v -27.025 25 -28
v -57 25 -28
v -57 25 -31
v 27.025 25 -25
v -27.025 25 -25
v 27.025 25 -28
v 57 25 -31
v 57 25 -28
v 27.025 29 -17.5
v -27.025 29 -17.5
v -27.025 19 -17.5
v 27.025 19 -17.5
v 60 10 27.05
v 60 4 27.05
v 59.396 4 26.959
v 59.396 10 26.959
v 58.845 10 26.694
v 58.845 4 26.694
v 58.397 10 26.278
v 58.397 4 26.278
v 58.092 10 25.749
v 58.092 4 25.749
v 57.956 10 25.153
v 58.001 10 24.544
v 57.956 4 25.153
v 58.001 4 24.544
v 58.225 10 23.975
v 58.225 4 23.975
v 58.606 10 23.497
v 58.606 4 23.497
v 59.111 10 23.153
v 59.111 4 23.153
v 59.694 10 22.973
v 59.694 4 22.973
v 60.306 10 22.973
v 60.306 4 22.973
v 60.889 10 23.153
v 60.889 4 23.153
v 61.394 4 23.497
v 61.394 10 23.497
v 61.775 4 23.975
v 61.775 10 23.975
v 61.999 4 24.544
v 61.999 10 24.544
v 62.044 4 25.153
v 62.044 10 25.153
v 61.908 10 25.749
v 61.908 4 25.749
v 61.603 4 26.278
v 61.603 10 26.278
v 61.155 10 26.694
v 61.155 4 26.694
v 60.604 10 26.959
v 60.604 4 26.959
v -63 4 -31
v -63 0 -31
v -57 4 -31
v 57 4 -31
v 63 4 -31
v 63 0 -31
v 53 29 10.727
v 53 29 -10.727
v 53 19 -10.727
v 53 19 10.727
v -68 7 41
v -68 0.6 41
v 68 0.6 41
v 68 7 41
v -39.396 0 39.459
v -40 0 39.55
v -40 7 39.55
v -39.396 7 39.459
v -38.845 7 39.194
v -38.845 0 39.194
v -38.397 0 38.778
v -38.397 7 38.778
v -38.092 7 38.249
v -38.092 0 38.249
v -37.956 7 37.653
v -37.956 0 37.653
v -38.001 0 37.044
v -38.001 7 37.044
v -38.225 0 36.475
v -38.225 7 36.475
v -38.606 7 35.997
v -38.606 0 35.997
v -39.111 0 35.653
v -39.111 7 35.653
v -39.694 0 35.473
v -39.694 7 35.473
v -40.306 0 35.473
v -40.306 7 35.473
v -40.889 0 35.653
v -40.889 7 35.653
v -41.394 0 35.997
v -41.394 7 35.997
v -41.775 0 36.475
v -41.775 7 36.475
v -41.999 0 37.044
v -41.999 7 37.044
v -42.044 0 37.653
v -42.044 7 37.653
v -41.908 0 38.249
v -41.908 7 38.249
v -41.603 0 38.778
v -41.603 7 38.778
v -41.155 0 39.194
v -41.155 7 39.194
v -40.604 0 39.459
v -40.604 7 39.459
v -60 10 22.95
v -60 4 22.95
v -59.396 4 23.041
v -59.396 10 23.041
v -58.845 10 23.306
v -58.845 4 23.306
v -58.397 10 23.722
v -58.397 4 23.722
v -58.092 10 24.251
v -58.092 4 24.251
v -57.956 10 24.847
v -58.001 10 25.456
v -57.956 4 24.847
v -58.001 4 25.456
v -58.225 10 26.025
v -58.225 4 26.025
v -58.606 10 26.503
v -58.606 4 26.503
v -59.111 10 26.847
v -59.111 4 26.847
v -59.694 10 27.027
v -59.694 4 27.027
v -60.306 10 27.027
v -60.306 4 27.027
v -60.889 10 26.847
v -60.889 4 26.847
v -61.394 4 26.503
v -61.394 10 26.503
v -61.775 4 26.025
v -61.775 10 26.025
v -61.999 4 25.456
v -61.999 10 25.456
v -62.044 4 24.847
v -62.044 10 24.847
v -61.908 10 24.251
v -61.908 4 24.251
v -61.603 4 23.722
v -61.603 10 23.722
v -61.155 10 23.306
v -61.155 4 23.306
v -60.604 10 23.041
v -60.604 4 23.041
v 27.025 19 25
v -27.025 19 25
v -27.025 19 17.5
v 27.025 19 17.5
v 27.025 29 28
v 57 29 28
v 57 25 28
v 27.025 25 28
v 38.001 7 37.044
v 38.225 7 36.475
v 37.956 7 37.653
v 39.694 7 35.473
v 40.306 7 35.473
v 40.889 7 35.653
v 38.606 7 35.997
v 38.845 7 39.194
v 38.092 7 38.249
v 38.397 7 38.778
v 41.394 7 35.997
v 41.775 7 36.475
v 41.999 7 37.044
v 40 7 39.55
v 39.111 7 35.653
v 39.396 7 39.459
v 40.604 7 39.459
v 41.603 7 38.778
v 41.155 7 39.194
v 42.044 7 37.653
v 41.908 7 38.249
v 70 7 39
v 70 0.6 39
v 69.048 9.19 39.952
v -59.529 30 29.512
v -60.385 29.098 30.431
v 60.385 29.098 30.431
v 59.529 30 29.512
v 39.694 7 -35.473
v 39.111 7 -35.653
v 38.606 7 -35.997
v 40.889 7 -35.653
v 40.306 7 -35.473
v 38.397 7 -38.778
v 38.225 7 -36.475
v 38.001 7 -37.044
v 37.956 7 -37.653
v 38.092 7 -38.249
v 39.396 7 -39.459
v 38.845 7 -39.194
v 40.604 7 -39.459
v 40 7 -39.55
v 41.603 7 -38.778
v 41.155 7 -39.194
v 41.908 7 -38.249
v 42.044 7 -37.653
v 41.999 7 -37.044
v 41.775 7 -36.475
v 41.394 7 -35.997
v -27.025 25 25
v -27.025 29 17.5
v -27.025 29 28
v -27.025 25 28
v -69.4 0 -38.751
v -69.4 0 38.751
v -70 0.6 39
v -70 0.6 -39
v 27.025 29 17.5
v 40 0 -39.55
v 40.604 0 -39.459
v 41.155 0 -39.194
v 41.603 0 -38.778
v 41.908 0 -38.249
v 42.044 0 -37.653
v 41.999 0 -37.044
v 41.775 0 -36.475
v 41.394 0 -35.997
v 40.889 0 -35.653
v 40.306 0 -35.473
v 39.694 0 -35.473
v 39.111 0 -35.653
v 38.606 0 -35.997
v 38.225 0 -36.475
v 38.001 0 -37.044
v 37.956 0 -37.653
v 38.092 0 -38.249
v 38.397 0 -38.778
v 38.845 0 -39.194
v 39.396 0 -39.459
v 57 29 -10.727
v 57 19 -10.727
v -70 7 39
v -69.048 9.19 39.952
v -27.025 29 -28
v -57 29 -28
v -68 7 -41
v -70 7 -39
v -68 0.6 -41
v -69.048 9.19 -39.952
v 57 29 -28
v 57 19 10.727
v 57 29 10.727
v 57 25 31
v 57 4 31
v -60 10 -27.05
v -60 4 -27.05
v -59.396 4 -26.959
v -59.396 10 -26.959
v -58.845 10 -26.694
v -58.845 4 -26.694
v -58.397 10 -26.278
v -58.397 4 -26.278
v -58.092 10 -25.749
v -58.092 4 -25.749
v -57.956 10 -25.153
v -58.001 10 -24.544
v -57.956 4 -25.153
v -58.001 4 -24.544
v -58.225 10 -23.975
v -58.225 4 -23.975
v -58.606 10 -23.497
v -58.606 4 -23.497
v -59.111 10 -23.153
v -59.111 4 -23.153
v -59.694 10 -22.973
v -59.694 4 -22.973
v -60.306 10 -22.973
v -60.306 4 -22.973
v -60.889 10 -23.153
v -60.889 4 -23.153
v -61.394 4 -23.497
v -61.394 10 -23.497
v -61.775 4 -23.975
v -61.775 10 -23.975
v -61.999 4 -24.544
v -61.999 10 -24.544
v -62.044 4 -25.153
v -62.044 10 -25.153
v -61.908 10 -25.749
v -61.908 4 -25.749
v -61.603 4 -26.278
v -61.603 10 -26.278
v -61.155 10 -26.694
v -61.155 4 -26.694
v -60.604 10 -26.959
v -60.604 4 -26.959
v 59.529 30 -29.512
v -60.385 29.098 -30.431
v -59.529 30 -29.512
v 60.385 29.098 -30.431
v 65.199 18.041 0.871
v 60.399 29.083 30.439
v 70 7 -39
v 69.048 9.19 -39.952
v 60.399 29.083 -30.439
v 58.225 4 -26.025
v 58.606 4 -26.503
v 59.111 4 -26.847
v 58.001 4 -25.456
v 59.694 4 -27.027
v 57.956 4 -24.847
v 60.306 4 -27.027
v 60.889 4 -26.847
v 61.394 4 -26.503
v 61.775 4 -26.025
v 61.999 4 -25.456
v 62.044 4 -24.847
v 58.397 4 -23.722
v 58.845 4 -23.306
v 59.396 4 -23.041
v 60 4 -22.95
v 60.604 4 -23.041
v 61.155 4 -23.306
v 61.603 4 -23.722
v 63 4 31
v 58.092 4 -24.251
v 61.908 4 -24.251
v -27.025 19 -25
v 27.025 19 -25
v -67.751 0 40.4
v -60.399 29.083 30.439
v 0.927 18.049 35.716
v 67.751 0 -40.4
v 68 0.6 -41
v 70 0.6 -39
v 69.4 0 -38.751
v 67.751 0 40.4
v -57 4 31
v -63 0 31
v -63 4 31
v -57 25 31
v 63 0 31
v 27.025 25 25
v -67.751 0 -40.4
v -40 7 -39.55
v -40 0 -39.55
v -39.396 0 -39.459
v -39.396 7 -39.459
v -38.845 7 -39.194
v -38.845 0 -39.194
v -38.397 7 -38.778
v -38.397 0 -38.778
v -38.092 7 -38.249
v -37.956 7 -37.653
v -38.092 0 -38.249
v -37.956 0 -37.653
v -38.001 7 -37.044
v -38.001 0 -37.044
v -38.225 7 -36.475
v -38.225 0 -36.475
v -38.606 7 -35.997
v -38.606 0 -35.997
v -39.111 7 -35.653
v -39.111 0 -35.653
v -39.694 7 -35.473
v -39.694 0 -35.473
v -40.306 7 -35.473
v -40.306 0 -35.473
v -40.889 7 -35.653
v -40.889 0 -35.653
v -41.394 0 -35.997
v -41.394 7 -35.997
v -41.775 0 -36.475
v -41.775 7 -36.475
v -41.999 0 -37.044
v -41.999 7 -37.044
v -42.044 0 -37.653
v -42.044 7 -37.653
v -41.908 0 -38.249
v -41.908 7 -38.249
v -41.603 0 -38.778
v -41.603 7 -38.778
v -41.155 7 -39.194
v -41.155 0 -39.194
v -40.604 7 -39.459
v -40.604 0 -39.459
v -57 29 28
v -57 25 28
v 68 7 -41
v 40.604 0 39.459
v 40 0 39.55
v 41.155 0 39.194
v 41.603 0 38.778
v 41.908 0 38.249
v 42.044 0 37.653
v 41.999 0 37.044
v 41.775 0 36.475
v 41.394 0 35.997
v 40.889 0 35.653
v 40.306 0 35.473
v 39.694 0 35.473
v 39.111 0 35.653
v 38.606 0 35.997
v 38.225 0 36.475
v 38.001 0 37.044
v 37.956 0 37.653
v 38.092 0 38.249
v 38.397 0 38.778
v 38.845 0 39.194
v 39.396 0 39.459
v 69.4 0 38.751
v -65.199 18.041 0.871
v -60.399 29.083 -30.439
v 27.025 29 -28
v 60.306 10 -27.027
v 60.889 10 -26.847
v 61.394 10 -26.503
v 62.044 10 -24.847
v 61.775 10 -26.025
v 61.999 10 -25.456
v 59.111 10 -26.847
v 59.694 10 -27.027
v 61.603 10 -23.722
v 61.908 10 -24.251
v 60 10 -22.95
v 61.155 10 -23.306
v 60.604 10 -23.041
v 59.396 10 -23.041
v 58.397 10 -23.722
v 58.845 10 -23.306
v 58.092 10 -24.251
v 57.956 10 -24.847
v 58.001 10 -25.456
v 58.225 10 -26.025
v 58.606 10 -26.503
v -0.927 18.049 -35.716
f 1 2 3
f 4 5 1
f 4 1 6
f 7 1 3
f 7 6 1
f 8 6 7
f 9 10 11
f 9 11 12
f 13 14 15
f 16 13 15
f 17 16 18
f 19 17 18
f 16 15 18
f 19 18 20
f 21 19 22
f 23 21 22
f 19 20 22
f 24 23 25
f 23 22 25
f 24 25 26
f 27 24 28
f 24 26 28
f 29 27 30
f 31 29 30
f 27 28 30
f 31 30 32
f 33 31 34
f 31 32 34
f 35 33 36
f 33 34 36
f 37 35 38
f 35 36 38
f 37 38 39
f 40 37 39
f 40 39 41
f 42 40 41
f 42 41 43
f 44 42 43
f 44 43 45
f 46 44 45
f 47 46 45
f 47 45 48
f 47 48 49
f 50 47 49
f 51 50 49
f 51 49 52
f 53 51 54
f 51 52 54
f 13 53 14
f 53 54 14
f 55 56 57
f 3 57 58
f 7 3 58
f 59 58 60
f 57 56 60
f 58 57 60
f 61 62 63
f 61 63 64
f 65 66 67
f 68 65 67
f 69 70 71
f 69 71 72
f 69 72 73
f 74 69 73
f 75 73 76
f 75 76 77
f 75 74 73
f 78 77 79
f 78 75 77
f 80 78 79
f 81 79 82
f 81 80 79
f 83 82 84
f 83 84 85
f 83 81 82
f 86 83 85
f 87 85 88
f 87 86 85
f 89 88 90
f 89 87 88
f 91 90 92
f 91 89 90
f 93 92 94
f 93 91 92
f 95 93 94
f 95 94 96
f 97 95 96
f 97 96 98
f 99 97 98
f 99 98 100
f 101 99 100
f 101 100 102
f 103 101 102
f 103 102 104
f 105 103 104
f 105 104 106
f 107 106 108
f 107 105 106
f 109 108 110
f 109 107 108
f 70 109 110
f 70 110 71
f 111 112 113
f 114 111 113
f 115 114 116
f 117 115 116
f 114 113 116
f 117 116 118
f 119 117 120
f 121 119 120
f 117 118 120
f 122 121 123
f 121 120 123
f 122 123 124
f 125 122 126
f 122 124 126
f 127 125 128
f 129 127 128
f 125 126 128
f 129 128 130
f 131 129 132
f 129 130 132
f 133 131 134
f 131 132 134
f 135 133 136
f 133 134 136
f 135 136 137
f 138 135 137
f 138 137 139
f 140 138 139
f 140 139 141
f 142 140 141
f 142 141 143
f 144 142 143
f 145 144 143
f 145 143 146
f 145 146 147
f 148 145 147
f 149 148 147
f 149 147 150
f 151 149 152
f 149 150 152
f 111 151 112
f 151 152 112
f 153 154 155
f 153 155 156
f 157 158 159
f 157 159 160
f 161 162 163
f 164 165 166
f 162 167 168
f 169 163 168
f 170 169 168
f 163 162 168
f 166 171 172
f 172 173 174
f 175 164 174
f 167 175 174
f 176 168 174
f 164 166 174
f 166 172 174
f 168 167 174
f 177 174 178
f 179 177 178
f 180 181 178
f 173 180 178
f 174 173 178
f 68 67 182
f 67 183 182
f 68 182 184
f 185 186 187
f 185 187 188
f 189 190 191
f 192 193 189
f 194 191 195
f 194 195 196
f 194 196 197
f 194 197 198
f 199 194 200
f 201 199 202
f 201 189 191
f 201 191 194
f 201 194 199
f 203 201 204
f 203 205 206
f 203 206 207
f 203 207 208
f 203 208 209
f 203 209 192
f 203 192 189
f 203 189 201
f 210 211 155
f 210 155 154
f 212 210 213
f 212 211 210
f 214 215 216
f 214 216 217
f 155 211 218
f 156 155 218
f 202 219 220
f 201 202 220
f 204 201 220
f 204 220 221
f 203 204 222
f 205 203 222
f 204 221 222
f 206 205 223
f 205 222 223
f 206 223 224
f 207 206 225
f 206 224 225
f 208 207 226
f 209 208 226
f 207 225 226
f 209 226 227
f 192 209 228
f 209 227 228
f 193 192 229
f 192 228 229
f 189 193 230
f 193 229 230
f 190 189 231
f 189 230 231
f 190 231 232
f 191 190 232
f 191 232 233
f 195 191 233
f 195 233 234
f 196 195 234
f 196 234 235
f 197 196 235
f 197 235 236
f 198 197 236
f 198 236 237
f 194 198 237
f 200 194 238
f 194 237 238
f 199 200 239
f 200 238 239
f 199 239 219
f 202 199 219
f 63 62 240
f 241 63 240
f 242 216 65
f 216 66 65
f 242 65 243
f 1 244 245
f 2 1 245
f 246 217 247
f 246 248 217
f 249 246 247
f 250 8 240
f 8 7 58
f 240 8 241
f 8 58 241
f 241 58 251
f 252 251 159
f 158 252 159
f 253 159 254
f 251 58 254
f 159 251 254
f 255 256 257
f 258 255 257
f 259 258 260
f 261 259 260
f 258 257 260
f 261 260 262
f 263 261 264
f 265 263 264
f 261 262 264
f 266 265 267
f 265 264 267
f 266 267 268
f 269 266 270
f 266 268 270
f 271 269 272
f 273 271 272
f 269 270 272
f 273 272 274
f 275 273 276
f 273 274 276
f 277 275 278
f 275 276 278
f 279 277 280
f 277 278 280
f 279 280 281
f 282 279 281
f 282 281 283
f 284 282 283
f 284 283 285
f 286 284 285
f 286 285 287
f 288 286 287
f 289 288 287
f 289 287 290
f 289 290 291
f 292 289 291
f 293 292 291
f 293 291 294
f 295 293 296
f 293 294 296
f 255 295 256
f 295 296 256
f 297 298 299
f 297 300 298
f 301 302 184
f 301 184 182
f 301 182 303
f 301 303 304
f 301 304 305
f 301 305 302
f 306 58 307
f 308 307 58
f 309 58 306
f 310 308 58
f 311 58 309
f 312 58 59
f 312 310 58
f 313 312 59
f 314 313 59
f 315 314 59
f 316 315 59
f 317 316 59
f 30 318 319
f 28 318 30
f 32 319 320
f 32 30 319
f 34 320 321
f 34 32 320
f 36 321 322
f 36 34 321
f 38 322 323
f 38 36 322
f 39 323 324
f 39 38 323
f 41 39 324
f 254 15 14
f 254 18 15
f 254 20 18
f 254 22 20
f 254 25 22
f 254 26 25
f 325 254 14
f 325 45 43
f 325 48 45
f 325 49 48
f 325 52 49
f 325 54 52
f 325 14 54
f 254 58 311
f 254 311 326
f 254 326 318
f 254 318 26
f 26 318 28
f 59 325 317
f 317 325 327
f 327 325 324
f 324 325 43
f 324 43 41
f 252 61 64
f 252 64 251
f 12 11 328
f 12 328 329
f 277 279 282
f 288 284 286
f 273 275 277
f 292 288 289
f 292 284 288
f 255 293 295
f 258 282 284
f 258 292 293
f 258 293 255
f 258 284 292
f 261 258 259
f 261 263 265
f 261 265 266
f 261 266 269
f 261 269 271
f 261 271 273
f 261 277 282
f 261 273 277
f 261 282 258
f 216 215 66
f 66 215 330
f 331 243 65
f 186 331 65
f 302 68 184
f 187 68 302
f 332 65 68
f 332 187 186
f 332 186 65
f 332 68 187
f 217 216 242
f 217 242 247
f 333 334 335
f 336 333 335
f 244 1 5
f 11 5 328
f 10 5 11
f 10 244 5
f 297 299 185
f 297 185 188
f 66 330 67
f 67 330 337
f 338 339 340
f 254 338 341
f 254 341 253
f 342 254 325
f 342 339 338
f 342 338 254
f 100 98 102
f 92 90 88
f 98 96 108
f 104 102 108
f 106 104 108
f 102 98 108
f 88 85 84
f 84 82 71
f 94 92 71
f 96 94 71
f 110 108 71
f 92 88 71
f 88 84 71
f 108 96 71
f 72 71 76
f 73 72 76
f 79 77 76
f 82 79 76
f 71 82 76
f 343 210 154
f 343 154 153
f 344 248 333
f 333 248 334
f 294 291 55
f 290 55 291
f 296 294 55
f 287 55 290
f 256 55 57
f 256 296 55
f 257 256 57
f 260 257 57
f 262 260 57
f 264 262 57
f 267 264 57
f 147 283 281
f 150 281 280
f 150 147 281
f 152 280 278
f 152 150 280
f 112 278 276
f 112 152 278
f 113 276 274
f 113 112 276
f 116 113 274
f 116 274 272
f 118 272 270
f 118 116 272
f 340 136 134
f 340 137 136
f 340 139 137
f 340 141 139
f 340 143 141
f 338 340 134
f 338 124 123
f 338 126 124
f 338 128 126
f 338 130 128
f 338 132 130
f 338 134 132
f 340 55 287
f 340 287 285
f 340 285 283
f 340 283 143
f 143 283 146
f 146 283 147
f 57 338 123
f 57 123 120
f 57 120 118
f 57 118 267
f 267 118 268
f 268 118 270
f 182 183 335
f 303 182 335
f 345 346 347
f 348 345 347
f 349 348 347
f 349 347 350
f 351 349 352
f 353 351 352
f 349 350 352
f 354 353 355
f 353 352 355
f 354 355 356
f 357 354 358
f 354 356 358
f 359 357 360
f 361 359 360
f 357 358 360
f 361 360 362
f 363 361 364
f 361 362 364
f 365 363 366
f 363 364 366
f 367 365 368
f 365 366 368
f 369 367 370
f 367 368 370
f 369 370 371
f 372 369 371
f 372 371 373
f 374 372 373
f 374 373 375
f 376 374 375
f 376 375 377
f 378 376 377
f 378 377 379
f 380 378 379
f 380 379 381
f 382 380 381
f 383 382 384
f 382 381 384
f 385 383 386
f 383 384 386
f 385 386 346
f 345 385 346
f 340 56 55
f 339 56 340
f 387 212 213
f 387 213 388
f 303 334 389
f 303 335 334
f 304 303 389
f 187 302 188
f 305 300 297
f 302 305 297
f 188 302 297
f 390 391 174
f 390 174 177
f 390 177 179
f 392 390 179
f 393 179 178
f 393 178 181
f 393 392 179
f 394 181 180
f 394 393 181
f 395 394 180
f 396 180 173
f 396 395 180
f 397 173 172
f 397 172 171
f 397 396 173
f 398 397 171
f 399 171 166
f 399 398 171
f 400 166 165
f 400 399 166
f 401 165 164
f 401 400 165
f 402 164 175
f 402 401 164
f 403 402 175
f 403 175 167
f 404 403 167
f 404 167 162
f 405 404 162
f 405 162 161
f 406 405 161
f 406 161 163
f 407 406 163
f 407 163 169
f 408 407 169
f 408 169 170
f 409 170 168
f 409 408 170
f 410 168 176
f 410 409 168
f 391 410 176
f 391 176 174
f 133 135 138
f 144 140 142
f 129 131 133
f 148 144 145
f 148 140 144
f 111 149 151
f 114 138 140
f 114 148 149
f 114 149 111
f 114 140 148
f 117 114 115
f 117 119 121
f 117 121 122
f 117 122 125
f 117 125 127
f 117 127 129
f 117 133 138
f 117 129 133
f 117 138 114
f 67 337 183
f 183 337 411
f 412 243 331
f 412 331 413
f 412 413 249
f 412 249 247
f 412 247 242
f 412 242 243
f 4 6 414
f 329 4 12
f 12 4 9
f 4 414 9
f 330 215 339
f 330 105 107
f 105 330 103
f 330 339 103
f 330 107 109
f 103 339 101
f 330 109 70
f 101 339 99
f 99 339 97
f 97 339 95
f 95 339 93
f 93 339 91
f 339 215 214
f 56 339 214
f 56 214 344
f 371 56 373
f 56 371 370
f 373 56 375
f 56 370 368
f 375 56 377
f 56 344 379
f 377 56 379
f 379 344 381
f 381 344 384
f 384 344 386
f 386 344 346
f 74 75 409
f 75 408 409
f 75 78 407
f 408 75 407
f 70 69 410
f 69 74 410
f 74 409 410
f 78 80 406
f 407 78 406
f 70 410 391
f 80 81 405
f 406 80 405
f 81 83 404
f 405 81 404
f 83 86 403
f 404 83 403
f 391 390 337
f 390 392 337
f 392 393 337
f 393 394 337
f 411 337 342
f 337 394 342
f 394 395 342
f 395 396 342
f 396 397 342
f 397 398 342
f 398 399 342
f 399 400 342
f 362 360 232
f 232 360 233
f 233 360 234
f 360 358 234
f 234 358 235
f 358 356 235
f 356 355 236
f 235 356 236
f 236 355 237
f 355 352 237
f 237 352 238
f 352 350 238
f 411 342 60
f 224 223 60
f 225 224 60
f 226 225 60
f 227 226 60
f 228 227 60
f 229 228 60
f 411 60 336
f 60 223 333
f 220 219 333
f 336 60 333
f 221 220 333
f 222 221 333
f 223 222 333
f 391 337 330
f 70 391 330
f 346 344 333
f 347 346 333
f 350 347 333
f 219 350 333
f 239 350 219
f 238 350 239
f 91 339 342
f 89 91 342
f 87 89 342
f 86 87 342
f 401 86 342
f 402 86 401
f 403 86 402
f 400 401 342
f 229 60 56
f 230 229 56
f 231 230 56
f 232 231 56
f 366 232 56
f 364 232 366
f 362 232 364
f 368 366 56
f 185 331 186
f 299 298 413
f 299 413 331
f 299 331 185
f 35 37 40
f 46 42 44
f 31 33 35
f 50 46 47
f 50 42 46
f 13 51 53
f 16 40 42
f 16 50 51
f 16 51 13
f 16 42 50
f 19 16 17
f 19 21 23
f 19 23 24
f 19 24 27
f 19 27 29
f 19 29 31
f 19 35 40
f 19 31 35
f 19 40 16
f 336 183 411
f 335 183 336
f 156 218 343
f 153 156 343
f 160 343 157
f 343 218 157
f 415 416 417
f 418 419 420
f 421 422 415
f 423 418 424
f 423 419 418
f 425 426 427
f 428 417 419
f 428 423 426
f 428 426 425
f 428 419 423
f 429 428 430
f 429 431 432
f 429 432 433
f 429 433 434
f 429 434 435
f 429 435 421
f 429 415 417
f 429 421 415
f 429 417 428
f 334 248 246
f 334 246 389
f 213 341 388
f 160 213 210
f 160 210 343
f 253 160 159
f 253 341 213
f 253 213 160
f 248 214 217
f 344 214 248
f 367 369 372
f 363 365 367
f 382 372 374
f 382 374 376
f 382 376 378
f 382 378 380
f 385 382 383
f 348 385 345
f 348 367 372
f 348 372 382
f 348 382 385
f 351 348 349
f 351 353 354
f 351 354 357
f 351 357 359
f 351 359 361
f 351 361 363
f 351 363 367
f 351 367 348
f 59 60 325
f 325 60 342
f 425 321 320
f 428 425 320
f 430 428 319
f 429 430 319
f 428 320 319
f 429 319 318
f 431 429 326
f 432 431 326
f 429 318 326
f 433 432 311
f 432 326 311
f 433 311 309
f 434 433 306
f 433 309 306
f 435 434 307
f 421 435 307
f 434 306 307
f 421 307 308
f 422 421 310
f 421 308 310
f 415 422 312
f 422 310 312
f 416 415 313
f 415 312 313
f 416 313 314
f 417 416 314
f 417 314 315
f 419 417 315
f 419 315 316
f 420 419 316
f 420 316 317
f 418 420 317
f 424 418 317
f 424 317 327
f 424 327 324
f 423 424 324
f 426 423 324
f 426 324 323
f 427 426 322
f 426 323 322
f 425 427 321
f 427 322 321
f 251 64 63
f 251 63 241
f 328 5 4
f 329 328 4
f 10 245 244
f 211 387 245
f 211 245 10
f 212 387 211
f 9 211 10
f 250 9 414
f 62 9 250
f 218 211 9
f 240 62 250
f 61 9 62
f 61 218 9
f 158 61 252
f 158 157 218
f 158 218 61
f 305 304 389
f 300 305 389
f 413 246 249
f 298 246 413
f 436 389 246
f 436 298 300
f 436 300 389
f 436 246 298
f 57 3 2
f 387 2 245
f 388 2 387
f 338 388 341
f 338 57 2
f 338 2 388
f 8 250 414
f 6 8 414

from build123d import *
from OCP.BRepFilletAPI import BRepFilletAPI_MakeChamfer

# Parameters (mm, degrees)
SKETCH1_W                       = 140
SKETCH1_H                       = 82
BOSS_EXTRUDE1_DEPTH             = 7
SKETCH3_W                       = 140
SKETCH3_H                       = 82
SKETCH2_W                       = 120
SKETCH2_H                       = 60
CHAMFER1_SIZE                   = 2
SKETCH4_R                       = 2.05
CUT_EXTRUDE1_DEPTH              = 7
SKETCH5_W                       = 114
SKETCH5_H                       = 50
CUT_EXTRUDE2_DEPTH              = 29
SKETCH6_W                       = 114
SKETCH6_H                       = 62
CUT_EXTRUDE3_DEPTH              = 25
SKETCH7_W                       = 6
SKETCH7_H                       = 62
CUT_EXTRUDE4_DEPTH              = 4
SKETCH8_R                       = 2.05
CUT_EXTRUDE5_DEPTH              = 6
CHAMFER2_SIZE                   = 1
CHAMFER2_SIZE2                  = 0.471497246
CHAMFER2_SIZE2_2                = 0.488486876
CHAMFER3_SIZE                   = 0.6
SKIZZE1_W                       = 54.050484576
SKIZZE1_H                       = 7.5
SKIZZE1_W_2                     = 4
SKIZZE1_H_2                     = 21.453027382
AUFSATZ_LINEAR_AUSTRAGEN1_DEPTH = 10
SKIZZE3_W                       = 29.974757712
SKIZZE3_H                       = 3
SCHNITT_LINEAR_AUSTRAGEN2_DEPTH = 4


with BuildPart() as part:
    # Sketch1 → Boss-Extrude1 (new body)
    with BuildSketch(Plane(origin=(0, 0, 0), x_dir=(1, 0, 0), z_dir=(0, 1, 0))):
        Rectangle(SKETCH1_W, SKETCH1_H)
    extrude(amount=BOSS_EXTRUDE1_DEPTH)

    # Sketch3 → Loft2 section 0
    with BuildSketch(Plane(origin=(0, 7, 0), x_dir=(1, 0, 0), z_dir=(0, 1, 0))):
        Rectangle(SKETCH3_W, SKETCH3_H)
    # Sketch2 → Loft2 section 1
    with BuildSketch(Plane(origin=(0, 30, 0), x_dir=(1, 0, 0), z_dir=(0, 1, 0))):
        Rectangle(SKETCH2_W, SKETCH2_H)
    loft()

    # Chamfer1
    chamfer1_edges = [part.edges().sort_by_distance(p)[0] for p in [
        (-70, 3.5, 41),
        (70, 3.5, 41),
        (70, 3.5, -41),
        (-70, 3.5, -41),
    ]]
    chamfer(chamfer1_edges, length=CHAMFER1_SIZE)

    # Sketch4 → Cut-Extrude1 (cut)
    with BuildSketch(Plane.XZ):
        with Locations(Location((40, -37.5, 0), (0, 0, 270))):
            Circle(SKETCH4_R)
        with Locations(Location((-40, -37.5, 0), (0, 0, 270))):
            Circle(SKETCH4_R)
    cut_extrude1 = extrude(amount=-CUT_EXTRUDE1_DEPTH, mode=Mode.SUBTRACT)

    # Sketch5 → Cut-Extrude2 (cut)
    with BuildSketch(Plane.XZ):
        Rectangle(SKETCH5_W, SKETCH5_H)
    extrude(amount=-CUT_EXTRUDE2_DEPTH, mode=Mode.SUBTRACT)

    # Mirror1: Cut-Extrude1 across plane
    add(cut_extrude1.mirror(Plane.XY), mode=Mode.SUBTRACT)

    # Sketch6 → Cut-Extrude3 (cut)
    with BuildSketch(Plane.XZ):
        Rectangle(SKETCH6_W, SKETCH6_H)
    extrude(amount=-CUT_EXTRUDE3_DEPTH, mode=Mode.SUBTRACT)

    # Sketch7 → Cut-Extrude4 (cut)
    with BuildSketch(Plane.XZ):
        with Locations((-60, 0)):
            Rectangle(SKETCH7_W, SKETCH7_H)
        with Locations((60, 0)):
            Rectangle(SKETCH7_W, SKETCH7_H)
    extrude(amount=-CUT_EXTRUDE4_DEPTH, mode=Mode.SUBTRACT)

    # Sketch8 → Cut-Extrude5 (cut)
    with BuildSketch(Plane.XZ.offset(-4)):
        with Locations(Location((-60, 25, 0), (0, 0, 270))):
            Circle(SKETCH8_R)
        with Locations(Location((-60, -25, 0), (0, 0, 270))):
            Circle(SKETCH8_R)
        with Locations(Location((60, -25, 0), (0, 0, 90))):
            Circle(SKETCH8_R)
        with Locations(Location((60, 25, 0), (0, 0, 90))):
            Circle(SKETCH8_R)
    extrude(amount=-CUT_EXTRUDE5_DEPTH, mode=Mode.SUBTRACT)

    # Chamfer2: one chamfer whose edges measure the first distance from different faces: ONE call of the kernel's chamfer builder (chamfer() names one face for all edges)
    chamfer2_edges_1 = [part.edges().sort_by_distance(p)[0] for p in [
        (60, 30, 0),
    ]]
    chamfer2_side_1 = [part.faces().sort_by_distance(p)[0] for p in [
        (65.246314621, 17.933476372, 0),
    ]]
    chamfer2_edges_2 = [part.edges().sort_by_distance(p)[0] for p in [
        (0, 30, -30),
    ]]
    chamfer2_side_2 = [part.faces().sort_by_distance(p)[0] for p in [
        (0, 18.220498667, -35.633674551),
    ]]
    chamfer2_edges_3 = [part.edges().sort_by_distance(p)[0] for p in [
        (-60, 30, 0),
    ]]
    chamfer2_side_3 = [part.faces().sort_by_distance(p)[0] for p in [
        (-65.246314621, 17.933476372, 0),
    ]]
    chamfer2_edges_4 = [part.edges().sort_by_distance(p)[0] for p in [
        (0, 30, 30),
    ]]
    chamfer2_side_4 = [part.faces().sort_by_distance(p)[0] for p in [
        (0, 18.220498667, 35.633674551),
    ]]
    chamfer2 = BRepFilletAPI_MakeChamfer(part.part.solid().wrapped)
    for e in chamfer2_edges_1:
        chamfer2.Add(CHAMFER2_SIZE, CHAMFER2_SIZE2, e.wrapped, chamfer2_side_1[0].wrapped)  # the first distance lies on this face
    for e in chamfer2_edges_2:
        chamfer2.Add(CHAMFER2_SIZE, CHAMFER2_SIZE2_2, e.wrapped, chamfer2_side_2[0].wrapped)  # the first distance lies on this face
    for e in chamfer2_edges_3:
        chamfer2.Add(CHAMFER2_SIZE, CHAMFER2_SIZE2, e.wrapped, chamfer2_side_3[0].wrapped)  # the first distance lies on this face
    for e in chamfer2_edges_4:
        chamfer2.Add(CHAMFER2_SIZE, CHAMFER2_SIZE2_2, e.wrapped, chamfer2_side_4[0].wrapped)  # the first distance lies on this face
    add(Compound.cast(chamfer2.Shape()), mode=Mode.REPLACE)

    # Chamfer3
    chamfer3_edges = [part.edges().sort_by_distance(p)[0] for p in [
        (0, 0, 41),
        (70, 0, 0),
        (-70, 0, 0),
        (0, 0, -41),
        (-69, 0, -40),
        (69, 0, -40),
        (69, 0, 40),
        (-69, 0, 40),
    ]]
    chamfer(chamfer3_edges, length=CHAMFER3_SIZE)

    # Skizze1 → Aufsatz-Linear austragen1 (add)
    with BuildSketch(Plane.XZ.offset(-29)):
        with Locations((0, -21.25)):
            Rectangle(SKIZZE1_W, SKIZZE1_H)
        with Locations((0, 21.25)):
            Rectangle(SKIZZE1_W, SKIZZE1_H)
        with Locations((55, 0)):
            Rectangle(SKIZZE1_W_2, SKIZZE1_H_2)
    extrude(amount=AUFSATZ_LINEAR_AUSTRAGEN1_DEPTH)

    # Skizze3 → Schnitt-Linear austragen2 (cut)
    with BuildSketch(Plane(origin=(0, 29, 0), x_dir=(-1, 0, 0), z_dir=(0, -1, 0))):
        with Locations((42.012621144, -26.5)):
            Rectangle(SKIZZE3_W, SKIZZE3_H)
        with Locations((-42.012621144, -26.5)):
            Rectangle(SKIZZE3_W, SKIZZE3_H)
        with Locations((42.012621144, 26.5)):
            Rectangle(SKIZZE3_W, SKIZZE3_H)
        with Locations((-42.012621144, 26.5)):
            Rectangle(SKIZZE3_W, SKIZZE3_H)
    extrude(amount=SCHNITT_LINEAR_AUSTRAGEN2_DEPTH, mode=Mode.SUBTRACT)


solid = part.part
